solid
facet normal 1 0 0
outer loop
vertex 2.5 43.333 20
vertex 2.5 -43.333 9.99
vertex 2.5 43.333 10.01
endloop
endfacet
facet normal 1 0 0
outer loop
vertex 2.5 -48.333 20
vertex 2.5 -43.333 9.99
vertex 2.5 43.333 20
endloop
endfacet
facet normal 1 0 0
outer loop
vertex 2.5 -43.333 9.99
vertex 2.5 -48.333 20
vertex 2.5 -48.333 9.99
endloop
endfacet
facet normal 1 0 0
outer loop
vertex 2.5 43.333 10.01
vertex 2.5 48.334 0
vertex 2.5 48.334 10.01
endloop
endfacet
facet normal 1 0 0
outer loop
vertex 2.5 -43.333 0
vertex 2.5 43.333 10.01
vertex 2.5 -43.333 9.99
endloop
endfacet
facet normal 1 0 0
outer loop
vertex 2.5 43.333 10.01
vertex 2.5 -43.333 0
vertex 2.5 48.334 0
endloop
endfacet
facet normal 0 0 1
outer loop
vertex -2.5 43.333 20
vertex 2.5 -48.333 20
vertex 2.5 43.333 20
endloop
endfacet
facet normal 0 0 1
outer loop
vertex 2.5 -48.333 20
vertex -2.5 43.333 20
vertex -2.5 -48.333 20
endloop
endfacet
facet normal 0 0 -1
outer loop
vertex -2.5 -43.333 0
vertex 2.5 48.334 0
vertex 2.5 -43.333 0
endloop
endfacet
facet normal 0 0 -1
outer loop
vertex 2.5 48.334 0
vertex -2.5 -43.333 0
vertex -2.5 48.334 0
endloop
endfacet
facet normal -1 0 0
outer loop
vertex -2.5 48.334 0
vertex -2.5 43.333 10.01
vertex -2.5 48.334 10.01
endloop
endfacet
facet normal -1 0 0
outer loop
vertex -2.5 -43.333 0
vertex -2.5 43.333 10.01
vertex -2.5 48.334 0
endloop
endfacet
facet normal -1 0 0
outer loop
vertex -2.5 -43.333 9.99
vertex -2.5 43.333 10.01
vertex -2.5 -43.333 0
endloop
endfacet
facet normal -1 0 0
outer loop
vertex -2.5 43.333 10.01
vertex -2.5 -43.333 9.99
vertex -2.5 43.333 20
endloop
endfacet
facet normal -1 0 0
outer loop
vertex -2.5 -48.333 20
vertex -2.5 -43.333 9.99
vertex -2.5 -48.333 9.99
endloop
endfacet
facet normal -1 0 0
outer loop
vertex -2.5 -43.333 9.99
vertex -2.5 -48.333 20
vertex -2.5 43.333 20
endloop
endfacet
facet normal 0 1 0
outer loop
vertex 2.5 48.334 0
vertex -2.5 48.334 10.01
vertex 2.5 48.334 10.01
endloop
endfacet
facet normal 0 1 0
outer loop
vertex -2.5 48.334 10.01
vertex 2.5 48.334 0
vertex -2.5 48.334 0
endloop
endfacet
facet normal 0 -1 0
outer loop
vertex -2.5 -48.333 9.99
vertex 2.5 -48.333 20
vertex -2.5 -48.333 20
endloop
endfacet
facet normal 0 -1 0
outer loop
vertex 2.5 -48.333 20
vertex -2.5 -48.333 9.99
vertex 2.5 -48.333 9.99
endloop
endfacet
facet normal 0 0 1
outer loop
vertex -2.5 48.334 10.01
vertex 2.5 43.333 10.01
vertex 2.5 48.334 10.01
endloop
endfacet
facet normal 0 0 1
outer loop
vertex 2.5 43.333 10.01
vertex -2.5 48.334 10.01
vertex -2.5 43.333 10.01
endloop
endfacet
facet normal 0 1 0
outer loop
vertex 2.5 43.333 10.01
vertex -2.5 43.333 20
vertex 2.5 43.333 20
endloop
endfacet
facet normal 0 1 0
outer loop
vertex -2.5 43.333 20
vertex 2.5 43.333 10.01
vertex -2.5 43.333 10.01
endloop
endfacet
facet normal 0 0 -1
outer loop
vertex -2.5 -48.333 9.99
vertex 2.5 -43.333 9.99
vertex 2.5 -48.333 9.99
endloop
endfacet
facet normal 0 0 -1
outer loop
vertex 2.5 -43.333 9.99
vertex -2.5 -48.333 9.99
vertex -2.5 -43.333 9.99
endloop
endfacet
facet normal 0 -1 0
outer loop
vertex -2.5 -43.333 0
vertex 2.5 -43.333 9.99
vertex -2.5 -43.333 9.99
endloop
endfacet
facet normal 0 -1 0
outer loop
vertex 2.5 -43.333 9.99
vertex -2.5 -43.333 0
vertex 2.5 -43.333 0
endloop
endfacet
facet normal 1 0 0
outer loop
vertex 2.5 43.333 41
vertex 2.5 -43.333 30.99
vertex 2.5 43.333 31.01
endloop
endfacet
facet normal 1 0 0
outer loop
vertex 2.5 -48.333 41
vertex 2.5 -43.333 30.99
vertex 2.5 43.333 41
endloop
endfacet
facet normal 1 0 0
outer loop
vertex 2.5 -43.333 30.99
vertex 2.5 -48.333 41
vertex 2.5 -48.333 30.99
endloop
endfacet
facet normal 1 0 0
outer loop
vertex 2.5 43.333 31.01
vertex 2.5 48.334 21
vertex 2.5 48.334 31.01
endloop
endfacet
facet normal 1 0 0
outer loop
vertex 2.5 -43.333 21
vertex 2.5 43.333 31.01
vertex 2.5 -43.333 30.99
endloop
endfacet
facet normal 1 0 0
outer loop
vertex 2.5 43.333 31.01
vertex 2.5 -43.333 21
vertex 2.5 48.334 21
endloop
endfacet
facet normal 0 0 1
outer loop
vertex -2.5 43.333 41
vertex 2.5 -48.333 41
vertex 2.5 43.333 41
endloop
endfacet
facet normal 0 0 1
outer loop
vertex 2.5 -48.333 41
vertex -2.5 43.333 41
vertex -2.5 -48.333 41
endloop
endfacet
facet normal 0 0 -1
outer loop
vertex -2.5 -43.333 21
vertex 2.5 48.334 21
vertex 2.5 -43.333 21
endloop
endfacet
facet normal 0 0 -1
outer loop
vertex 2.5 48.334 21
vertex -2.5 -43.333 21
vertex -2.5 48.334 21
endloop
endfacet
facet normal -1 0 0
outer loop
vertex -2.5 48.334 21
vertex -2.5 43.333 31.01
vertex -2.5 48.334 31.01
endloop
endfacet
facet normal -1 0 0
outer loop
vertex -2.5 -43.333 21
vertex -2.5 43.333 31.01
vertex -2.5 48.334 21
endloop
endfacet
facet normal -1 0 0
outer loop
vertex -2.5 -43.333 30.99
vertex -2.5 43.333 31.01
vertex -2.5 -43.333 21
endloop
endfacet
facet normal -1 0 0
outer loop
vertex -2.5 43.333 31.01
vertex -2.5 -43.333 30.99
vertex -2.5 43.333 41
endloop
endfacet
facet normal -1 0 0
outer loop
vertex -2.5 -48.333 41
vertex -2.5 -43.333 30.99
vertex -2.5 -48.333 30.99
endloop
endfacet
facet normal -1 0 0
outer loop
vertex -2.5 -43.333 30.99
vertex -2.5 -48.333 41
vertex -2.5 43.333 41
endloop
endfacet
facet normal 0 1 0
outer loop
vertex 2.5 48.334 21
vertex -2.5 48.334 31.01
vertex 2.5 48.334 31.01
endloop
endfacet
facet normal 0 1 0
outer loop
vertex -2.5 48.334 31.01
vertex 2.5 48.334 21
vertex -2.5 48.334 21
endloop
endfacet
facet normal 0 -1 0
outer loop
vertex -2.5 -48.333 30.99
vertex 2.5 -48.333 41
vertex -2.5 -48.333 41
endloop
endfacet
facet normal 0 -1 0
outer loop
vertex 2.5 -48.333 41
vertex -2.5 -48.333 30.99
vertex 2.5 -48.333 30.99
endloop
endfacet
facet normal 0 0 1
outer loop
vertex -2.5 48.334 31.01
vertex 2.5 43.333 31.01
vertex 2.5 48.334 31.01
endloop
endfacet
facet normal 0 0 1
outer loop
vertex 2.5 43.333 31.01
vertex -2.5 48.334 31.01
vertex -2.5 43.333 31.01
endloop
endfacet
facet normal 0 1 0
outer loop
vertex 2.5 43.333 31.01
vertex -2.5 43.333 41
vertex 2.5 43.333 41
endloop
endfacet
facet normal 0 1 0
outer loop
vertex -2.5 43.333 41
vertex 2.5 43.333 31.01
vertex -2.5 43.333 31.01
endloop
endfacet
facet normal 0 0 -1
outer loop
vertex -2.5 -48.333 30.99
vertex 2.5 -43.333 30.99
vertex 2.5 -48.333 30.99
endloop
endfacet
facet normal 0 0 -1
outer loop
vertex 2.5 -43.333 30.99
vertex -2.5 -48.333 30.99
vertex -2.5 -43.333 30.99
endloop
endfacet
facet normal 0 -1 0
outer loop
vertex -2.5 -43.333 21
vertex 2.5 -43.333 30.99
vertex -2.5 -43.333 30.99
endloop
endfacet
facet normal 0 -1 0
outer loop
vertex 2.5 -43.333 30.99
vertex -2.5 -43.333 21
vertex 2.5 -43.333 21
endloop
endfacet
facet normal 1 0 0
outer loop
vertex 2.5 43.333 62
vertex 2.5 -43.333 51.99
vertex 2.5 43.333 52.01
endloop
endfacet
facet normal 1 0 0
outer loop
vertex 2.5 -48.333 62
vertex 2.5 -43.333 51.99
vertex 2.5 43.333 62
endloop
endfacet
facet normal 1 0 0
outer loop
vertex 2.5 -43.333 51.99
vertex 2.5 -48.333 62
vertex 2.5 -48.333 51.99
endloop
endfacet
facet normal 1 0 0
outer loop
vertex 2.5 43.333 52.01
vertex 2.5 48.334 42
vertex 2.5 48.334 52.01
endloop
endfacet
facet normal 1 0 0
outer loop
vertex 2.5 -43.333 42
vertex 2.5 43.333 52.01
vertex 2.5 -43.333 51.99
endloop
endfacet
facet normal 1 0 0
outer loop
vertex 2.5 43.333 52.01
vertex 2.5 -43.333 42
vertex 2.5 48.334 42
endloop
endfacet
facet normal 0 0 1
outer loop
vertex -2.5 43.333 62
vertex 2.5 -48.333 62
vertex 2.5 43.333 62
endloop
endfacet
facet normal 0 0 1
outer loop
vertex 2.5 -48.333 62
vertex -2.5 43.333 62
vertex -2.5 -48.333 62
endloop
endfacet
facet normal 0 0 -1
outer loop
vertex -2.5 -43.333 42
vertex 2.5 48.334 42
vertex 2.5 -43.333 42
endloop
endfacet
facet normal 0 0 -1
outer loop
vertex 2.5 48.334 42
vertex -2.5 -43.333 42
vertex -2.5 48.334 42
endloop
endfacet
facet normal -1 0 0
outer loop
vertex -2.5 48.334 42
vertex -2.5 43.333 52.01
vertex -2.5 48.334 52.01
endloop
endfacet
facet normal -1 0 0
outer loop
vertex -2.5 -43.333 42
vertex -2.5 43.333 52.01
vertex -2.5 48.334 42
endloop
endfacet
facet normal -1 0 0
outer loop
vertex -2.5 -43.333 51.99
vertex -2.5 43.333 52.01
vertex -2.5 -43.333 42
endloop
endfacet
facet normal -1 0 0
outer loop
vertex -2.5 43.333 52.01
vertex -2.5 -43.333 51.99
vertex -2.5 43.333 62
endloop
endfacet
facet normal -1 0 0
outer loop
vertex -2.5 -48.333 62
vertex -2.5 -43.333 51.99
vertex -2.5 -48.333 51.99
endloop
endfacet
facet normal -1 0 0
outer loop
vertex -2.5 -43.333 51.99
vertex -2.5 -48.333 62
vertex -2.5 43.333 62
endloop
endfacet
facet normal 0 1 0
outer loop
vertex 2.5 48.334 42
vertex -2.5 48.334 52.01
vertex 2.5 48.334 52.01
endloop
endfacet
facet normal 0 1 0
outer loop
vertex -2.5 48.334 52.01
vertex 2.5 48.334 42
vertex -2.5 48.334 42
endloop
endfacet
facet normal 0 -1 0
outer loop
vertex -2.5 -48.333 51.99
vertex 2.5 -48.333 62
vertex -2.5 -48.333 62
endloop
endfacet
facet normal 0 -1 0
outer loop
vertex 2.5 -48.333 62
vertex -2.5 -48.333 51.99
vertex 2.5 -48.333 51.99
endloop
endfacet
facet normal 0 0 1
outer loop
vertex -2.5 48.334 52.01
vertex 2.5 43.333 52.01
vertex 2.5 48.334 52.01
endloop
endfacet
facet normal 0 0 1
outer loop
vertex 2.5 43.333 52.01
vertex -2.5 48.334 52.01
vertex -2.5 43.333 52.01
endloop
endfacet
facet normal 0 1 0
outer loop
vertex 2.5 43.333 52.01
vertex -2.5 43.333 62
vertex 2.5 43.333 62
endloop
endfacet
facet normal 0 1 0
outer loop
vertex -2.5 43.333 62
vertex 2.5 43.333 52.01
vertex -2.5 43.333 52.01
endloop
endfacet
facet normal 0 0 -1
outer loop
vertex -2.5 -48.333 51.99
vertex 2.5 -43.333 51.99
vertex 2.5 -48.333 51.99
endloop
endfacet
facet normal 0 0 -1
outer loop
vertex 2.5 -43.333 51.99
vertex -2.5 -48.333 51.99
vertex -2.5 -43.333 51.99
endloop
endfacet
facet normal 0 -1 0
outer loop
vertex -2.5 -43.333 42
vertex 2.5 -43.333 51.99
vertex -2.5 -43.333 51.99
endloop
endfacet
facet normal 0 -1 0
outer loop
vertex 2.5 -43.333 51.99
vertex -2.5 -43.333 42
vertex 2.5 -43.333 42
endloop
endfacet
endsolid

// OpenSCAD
$fn=64;
union(){difference(){translate(v = [-2.500, -48.333])
cube(size = [5, 96.667, 20]);
translate(v = [-0.100, 45.933, 10.010])
translate(v = [-2.600, -2.600])
cube(size = [5.200, 5.200, 10.000]);
translate(v = [-0.100, -45.933, -0.010])
translate(v = [-2.600, -2.600])
cube(size = [5.200, 5.200, 10.000]);
}
translate(v = [0, 0, 21])
difference(){translate(v = [-2.500, -48.333])
cube(size = [5, 96.667, 20]);
translate(v = [-0.100, 45.933, 10.010])
translate(v = [-2.600, -2.600])
cube(size = [5.200, 5.200, 10.000]);
translate(v = [-0.100, -45.933, -0.010])
translate(v = [-2.600, -2.600])
cube(size = [5.200, 5.200, 10.000]);
}
translate(v = [0, 0, 42])
difference(){translate(v = [-2.500, -48.333])
cube(size = [5, 96.667, 20]);
translate(v = [-0.100, 45.933, 10.010])
translate(v = [-2.600, -2.600])
cube(size = [5.200, 5.200, 10.000]);
translate(v = [-0.100, -45.933, -0.010])
translate(v = [-2.600, -2.600])
cube(size = [5.200, 5.200, 10.000]);
}
}
